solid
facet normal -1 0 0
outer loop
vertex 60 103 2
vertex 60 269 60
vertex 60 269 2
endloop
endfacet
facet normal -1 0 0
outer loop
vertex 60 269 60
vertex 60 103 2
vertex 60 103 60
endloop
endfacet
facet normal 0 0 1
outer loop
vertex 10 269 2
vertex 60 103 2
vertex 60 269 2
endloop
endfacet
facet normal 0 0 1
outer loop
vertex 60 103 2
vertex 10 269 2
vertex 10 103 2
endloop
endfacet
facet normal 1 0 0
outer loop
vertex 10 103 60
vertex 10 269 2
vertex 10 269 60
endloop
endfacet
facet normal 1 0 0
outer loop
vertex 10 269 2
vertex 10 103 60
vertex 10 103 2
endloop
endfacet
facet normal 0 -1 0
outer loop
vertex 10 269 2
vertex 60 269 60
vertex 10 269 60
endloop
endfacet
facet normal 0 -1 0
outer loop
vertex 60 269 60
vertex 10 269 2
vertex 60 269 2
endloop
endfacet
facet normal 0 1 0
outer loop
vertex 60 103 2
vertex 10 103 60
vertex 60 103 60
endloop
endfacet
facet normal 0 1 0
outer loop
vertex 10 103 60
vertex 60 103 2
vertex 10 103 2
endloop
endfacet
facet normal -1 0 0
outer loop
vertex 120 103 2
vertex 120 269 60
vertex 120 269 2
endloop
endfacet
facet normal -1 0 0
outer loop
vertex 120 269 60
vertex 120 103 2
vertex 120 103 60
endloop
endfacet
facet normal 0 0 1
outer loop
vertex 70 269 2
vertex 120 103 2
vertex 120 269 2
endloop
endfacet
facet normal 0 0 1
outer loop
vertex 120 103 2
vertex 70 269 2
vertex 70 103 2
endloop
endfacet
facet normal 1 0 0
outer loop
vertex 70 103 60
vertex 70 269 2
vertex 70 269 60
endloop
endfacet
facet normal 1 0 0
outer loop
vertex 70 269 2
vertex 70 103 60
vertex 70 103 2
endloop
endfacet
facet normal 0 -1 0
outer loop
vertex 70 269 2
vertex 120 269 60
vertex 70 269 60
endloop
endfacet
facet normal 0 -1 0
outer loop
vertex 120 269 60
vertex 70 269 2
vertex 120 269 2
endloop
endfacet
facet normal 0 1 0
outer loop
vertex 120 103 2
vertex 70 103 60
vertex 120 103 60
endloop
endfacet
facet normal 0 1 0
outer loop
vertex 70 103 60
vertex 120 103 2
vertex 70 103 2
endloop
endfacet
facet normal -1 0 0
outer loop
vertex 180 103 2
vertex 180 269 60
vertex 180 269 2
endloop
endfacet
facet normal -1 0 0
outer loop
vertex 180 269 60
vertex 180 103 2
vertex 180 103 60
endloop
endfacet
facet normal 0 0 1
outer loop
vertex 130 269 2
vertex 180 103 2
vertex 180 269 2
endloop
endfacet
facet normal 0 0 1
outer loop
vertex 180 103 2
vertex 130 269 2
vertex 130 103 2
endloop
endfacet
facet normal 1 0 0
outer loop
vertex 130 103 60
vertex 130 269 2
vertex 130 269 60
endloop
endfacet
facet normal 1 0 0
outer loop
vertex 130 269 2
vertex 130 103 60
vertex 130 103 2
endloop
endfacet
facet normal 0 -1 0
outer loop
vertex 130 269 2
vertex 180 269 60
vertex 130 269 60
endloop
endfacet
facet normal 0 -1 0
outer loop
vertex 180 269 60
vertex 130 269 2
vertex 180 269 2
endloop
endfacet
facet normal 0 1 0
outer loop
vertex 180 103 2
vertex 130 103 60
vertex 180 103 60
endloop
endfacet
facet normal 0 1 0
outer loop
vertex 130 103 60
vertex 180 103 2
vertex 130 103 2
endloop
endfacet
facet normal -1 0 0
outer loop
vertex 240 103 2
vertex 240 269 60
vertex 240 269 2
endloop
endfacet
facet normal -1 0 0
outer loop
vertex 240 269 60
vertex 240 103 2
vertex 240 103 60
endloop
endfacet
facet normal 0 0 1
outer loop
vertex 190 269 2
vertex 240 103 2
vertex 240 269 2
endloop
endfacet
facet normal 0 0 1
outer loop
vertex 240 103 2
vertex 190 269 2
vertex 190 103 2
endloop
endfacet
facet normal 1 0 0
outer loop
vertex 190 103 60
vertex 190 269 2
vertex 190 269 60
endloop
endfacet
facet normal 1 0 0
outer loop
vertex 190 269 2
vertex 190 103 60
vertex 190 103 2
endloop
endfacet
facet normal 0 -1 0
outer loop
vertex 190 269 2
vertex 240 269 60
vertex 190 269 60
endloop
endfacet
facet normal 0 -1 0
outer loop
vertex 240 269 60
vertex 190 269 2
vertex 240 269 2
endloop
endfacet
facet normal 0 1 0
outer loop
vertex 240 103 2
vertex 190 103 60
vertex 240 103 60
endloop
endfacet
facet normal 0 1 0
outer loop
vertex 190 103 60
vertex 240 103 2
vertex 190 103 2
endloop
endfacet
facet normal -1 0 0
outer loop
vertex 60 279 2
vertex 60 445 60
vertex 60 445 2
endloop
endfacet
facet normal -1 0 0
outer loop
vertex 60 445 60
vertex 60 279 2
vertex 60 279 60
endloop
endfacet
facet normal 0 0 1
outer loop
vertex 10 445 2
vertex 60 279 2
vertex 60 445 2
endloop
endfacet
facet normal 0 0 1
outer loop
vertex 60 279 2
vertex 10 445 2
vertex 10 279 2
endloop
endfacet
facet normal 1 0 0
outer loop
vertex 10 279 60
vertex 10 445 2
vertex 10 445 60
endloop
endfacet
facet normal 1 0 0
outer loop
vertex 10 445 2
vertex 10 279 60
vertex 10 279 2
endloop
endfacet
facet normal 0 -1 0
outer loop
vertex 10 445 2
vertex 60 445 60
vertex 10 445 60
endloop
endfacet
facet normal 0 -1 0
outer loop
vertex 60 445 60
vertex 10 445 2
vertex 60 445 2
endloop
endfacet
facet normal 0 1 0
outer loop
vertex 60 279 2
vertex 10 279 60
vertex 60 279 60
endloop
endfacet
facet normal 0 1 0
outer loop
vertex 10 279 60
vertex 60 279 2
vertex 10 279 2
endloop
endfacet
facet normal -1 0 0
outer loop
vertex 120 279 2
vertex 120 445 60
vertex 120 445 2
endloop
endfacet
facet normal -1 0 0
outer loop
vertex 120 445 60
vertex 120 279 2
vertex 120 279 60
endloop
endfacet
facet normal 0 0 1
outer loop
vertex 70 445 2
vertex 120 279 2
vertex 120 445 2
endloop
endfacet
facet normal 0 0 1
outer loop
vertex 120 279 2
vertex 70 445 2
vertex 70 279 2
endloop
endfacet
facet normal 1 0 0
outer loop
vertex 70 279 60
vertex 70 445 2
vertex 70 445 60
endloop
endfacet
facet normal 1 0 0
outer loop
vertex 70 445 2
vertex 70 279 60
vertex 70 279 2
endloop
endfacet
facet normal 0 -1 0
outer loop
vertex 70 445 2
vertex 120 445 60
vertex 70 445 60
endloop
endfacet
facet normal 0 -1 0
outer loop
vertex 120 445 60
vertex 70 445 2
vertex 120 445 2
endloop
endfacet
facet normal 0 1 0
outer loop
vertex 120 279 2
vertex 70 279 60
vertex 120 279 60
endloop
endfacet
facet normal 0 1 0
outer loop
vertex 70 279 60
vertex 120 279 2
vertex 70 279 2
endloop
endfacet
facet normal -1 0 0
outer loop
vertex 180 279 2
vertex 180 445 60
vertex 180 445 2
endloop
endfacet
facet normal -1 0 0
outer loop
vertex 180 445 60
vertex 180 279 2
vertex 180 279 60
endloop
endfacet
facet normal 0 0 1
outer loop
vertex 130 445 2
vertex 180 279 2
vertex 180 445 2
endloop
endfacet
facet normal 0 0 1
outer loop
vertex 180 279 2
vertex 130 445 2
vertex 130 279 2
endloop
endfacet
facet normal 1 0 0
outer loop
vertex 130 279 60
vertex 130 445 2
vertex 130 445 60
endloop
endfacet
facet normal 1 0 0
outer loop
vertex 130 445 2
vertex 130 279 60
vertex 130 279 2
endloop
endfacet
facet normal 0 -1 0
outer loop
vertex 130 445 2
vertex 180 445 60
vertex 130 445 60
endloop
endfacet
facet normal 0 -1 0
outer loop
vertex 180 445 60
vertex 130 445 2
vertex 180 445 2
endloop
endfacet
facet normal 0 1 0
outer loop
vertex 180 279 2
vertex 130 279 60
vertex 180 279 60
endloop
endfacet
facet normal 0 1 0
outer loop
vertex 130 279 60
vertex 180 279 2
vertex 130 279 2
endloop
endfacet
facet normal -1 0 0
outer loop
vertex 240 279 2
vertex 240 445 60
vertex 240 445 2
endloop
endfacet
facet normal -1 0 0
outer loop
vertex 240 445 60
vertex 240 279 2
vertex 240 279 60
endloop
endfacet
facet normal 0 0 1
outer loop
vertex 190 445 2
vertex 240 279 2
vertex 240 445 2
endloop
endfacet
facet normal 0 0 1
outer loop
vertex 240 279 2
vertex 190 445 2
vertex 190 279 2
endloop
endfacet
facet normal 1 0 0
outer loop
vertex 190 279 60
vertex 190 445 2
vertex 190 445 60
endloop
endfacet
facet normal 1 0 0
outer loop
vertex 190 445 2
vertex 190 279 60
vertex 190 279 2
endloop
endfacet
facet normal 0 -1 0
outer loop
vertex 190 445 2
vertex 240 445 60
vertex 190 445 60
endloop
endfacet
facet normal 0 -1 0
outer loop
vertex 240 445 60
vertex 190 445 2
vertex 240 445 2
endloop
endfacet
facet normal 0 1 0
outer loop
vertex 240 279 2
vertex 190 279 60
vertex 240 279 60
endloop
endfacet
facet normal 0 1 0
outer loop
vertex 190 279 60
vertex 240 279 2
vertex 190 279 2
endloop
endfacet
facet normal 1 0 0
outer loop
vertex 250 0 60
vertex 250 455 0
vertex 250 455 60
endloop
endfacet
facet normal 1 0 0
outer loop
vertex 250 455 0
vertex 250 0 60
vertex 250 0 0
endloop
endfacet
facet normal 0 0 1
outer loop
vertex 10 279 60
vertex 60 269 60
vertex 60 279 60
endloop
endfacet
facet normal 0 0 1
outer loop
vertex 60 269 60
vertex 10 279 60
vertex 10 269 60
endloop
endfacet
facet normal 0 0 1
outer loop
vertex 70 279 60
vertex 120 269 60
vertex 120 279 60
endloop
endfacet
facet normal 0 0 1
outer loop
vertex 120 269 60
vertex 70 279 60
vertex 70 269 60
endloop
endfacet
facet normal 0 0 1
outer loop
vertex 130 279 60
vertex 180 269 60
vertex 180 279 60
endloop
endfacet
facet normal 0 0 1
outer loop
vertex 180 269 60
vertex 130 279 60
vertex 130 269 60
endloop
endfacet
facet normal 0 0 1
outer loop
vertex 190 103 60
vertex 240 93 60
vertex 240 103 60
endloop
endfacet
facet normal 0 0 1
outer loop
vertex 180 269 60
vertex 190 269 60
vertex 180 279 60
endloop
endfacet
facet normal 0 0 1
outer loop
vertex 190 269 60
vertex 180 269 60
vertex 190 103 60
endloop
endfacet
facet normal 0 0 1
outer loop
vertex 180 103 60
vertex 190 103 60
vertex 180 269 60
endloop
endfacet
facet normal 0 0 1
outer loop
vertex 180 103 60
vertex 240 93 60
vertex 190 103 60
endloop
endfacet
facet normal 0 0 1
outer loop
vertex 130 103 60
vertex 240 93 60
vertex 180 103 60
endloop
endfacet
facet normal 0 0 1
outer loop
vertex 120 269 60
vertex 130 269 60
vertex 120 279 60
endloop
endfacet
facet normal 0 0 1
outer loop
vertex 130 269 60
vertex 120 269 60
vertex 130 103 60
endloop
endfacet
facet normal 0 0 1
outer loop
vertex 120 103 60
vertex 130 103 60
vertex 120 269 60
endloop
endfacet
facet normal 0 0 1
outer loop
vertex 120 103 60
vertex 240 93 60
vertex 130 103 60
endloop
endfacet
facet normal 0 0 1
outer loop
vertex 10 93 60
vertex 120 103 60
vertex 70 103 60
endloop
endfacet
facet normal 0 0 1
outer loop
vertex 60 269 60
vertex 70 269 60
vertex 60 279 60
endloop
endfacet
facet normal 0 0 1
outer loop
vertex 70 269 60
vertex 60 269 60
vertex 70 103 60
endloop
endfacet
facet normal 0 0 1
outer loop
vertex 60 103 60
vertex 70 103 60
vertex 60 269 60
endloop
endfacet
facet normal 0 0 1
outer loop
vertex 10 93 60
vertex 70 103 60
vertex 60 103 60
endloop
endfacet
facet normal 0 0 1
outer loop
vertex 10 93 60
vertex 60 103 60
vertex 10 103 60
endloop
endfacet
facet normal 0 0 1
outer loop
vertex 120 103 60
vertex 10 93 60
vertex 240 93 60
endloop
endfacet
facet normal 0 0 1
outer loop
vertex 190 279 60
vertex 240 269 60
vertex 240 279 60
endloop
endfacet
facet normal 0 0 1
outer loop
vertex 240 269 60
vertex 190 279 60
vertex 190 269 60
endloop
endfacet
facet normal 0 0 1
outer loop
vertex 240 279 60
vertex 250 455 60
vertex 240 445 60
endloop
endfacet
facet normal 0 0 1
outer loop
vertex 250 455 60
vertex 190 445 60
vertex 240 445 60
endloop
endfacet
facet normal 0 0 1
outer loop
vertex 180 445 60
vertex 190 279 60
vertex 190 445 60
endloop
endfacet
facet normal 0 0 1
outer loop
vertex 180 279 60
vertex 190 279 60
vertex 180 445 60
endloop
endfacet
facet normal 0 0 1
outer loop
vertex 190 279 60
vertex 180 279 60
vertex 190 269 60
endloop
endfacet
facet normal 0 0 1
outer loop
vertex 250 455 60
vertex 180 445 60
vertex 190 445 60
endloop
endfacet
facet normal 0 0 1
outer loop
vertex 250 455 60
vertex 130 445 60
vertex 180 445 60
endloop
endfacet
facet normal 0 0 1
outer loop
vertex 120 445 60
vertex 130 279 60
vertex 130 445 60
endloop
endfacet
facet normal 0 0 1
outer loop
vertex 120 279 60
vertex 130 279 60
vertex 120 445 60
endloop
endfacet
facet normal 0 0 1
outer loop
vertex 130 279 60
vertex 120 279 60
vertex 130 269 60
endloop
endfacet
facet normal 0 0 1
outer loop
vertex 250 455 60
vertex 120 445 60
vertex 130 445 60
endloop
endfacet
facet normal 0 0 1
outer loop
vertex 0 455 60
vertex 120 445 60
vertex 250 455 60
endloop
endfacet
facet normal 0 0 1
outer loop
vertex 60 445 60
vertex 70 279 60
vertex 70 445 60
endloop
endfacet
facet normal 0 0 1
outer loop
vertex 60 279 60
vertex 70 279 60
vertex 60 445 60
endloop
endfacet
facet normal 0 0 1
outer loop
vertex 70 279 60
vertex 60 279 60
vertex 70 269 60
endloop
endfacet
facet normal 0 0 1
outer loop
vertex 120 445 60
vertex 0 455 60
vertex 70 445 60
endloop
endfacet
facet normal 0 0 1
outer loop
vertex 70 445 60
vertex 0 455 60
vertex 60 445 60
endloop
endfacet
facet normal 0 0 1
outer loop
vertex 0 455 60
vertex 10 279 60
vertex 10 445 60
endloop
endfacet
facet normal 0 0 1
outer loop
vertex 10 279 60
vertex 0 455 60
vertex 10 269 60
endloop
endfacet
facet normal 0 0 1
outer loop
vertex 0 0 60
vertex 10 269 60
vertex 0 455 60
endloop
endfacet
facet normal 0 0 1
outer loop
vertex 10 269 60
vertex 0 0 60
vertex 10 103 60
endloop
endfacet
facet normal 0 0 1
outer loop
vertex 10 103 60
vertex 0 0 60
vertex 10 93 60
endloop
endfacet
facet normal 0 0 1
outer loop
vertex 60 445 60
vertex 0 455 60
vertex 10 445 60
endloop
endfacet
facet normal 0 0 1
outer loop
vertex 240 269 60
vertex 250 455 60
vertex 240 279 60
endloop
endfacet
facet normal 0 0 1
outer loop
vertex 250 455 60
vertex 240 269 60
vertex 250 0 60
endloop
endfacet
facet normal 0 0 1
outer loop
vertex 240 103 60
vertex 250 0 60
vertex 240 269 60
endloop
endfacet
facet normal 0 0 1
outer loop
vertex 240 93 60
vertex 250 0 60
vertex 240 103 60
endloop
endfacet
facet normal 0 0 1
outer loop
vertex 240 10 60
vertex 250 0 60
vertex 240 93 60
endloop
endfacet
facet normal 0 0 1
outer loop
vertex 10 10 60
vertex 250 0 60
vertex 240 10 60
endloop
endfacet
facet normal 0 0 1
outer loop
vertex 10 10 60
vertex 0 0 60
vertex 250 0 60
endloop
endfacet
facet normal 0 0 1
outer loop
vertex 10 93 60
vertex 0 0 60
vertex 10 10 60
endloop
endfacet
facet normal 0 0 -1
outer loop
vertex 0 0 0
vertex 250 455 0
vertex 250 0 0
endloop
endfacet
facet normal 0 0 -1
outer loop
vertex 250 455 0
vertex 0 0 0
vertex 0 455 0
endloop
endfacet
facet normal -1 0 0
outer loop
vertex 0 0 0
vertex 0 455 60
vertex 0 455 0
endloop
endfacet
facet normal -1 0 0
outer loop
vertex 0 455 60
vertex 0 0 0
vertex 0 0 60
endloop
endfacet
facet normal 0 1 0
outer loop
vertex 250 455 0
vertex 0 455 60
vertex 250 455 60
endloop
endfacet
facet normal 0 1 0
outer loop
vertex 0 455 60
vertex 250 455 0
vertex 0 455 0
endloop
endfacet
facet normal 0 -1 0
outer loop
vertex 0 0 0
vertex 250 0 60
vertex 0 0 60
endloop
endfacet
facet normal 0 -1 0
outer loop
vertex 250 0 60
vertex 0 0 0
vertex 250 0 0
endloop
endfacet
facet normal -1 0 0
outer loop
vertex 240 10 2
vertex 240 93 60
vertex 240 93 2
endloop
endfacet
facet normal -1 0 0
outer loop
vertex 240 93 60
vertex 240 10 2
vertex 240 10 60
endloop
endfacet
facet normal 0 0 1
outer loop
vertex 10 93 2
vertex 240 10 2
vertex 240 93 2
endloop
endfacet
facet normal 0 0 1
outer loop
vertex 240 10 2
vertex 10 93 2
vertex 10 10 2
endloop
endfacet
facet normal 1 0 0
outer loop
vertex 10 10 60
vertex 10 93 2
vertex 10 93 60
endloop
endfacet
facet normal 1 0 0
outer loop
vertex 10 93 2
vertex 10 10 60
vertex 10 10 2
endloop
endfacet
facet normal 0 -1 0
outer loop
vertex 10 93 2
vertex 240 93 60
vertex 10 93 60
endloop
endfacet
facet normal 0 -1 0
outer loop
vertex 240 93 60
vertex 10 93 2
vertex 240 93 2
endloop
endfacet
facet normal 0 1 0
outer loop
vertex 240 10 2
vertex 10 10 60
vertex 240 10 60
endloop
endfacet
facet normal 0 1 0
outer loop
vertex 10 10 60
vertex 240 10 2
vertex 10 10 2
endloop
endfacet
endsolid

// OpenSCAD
Width = 250;
Length = 455;
Height = 60;
Wall_Thickness = 10;
Wall_Slope = 2;
Wall_Fillet = 4;
Floor_Thickness = 2;
Columns = 4;

$fa = $preview ? 15 : 1;
$fs = $preview ? 3 : 0.75;
column = (Width - Wall_Thickness*(Columns+1)) / Columns;
interior_length = Length - Wall_Thickness*4;
landscape_length = interior_length*1/5;
cutout_length = (interior_length*4/5) / 2;

difference() {
	cube([Width, Length, Height]);
	translate([Wall_Thickness, Wall_Thickness, Floor_Thickness])
		cutout(Width-Wall_Thickness*2, landscape_length);
	translate([0, landscape_length+Wall_Thickness, 0]) {
		row(cutout_length);
		translate([0, cutout_length+Wall_Thickness, 0])
			row(cutout_length);
	}
}

module row(length) {
	translate([Wall_Thickness, Wall_Thickness, Floor_Thickness])
		for (i = [0:Columns-1]) {
			translate([Wall_Thickness*i + column*i, 0, 0])
				cutout(column, length);
		}
}

module cutout(width, length) {
	cube([width, length, Height]);
}
